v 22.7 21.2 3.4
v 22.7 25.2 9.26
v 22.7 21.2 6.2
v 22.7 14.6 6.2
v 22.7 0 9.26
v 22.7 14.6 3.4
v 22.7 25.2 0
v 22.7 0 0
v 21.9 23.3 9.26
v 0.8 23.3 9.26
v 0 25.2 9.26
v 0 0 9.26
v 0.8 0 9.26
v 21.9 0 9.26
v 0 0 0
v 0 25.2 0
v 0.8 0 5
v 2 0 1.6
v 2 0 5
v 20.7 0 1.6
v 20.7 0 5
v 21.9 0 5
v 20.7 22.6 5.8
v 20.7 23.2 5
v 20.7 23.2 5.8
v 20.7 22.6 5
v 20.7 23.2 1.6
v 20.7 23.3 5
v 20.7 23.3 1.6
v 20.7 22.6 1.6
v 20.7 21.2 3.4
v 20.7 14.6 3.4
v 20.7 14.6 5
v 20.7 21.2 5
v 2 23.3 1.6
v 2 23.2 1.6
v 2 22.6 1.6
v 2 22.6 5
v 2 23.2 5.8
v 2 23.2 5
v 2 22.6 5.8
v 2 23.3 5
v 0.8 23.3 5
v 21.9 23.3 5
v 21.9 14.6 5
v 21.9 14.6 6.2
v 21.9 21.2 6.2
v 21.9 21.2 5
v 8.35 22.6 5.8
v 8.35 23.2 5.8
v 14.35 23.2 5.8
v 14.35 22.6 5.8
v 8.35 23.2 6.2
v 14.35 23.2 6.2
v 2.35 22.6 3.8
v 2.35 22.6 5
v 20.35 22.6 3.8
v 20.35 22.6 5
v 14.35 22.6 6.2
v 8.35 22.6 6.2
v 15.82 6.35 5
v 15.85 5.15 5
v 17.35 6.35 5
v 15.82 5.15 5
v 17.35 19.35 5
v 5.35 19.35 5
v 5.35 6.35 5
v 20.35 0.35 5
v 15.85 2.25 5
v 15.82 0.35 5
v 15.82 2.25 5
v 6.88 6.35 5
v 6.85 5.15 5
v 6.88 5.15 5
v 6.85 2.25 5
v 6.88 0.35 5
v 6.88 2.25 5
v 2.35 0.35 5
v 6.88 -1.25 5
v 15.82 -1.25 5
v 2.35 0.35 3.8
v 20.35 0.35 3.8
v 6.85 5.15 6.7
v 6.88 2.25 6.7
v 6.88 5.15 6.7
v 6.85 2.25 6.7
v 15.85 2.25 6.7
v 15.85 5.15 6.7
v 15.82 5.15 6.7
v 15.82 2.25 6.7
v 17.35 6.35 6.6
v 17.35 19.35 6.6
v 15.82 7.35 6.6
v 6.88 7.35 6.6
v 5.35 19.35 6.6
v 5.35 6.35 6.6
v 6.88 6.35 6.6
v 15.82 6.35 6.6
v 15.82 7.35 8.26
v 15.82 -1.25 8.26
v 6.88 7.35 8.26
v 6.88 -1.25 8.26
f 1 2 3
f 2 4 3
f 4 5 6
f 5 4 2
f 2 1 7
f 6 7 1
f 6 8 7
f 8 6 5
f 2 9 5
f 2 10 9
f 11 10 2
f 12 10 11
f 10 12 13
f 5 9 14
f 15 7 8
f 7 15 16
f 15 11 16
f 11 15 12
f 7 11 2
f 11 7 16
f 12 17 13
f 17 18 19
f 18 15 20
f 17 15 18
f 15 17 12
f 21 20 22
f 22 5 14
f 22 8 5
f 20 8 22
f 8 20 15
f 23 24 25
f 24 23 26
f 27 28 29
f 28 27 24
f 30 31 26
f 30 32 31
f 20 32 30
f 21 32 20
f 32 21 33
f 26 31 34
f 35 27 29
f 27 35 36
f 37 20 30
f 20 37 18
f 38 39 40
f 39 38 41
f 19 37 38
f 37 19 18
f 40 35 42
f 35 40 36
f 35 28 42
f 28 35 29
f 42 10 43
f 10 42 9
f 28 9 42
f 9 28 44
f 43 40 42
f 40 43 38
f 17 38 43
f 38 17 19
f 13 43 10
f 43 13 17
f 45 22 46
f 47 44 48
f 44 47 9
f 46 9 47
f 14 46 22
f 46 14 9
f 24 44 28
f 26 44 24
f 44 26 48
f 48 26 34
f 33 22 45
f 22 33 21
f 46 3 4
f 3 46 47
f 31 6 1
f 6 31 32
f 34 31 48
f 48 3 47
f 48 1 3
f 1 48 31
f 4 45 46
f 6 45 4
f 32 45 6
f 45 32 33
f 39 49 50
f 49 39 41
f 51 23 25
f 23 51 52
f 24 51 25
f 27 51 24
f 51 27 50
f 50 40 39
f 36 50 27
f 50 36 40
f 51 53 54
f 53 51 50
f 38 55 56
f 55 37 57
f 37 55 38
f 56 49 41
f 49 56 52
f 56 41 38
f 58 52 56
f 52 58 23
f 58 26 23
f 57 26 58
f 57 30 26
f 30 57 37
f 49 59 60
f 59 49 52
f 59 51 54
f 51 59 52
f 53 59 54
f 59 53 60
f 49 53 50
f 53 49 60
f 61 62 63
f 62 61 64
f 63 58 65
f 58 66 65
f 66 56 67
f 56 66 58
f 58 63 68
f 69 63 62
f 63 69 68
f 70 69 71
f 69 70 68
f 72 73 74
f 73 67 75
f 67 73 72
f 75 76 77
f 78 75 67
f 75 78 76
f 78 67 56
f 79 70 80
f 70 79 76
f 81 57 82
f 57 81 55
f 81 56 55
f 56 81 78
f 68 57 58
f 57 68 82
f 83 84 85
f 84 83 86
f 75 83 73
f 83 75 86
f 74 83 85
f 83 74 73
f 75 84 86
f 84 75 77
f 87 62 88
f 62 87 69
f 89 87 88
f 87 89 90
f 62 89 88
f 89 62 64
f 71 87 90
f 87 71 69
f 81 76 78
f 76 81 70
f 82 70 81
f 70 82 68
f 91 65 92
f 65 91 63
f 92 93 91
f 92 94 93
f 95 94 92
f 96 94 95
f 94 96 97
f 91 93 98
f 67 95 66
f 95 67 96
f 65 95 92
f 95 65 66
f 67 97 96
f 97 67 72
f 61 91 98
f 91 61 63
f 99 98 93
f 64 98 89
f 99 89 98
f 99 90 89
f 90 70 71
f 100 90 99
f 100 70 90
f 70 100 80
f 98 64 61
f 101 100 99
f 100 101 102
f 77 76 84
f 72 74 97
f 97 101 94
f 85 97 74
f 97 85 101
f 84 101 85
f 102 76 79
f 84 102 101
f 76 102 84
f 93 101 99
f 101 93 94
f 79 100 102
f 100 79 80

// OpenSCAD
// =============================================================================
// mini7seg_esp_cradle.scad
//
// How an ESP32-C3 Super Mini — which has NO mounting holes — is held in the
// back of the display enclosure, free-wired, with its USB-C reachable.
//
// THE LOAD PATH IS THE WHOLE DESIGN
//   The only rigid, structural thing on this board is the USB-C shell: it is
//   soldered down with big anchor tabs and it is the one feature that can take
//   a shove. So the cradle uses it as the datum, and everything else just stops
//   the board rattling.
//
//     plugging a cable IN   pushes the board deeper  -> a hard stop behind the
//                                                       far end takes it
//     pulling a cable OUT   drags the board forward  -> the entry lip takes it
//     everything else       lift/rattle              -> the side slots take it
//
//   Get this backwards — retain the far end and leave the USB end floating —
//   and every insertion levers the connector off its pads. That is the usual
//   way these boards die.
//
// SLIDES IN FROM THE BACK, USB-C END FIRST, before the panel goes in.
//
// ⚠ DIMENSIONS ARE FROM PHOTOGRAPHS AND DATASHEET-TYPICALS, NOT MEASURED.
//   Caliper the four marked CHECK values before printing anything.
// =============================================================================

// ---------- ESP32-C3 Super Mini ----------
esp_w       = 18.0;    // CHECK  across the castellated rows
esp_l       = 22.5;    // CHECK  along the USB axis
esp_t       = 1.2;     // CHECK  pcb only
mod_w       = 12.0;    // the shielded module can
mod_l       = 13.0;
mod_t       = 1.6;
usb_w       = 8.94;    // CHECK  USB-C receptacle shell
usb_t       = 3.26;
usb_proud   = 1.6;     // how far it oversails the board edge
btn_w       = 3.5;     // RST and BOOT, either side of centre
btn_l       = 2.9;
btn_t       = 1.7;
btn_gap     = 2.0;     // between the two buttons

// ---------- fit ----------
slack       = 0.35;    // per side, board to slot
slot_grip   = 1.2;     // how far the side slots overlap the pcb edge
floor_t     = 1.6;
rail_t      = 2.2;     // material under the board, above the floor
wall        = 2.0;
btn_clear   = 1.0;     // air above the buttons so nothing presses them

// ---------- wiring ----------
// Three wires only: 5V, GND, one data. On this board 5V and G are adjacent on
// the right-hand row, with GPIO 0-4 directly below them, so all three land on
// ONE edge and the loom leaves as a single bundle.
wire_d      = 1.6;     // 22 AWG with insulation
wire_n      = 3;

// "cradle" | "fitted" | "section" | "exploded" | "esp"
mode = "fitted";

// ---------- derived ----------
pocket_w    = esp_w + 2 * slack;
pocket_l    = esp_l + 2 * slack;
z_board     = floor_t + rail_t;                 // underside of the pcb
z_top       = z_board + esp_t;                  // top face of the pcb
cradle_h    = z_top + max(usb_t, mod_t, btn_t + btn_clear) + 1.0;

// =============================================================================
// THE BOARD ITSELF — modelled so the clearances can be seen, not guessed
// =============================================================================
module esp32_c3() {
    // pcb
    color([0.10, 0.10, 0.12]) cube([esp_w, esp_l, esp_t]);
    // castellated pads, 8 per side at 2.54
    color([0.85, 0.70, 0.30])
        for (s = [0, 1], i = [0 : 7])
            translate([s ? esp_w - 0.9 : 0, 2.2 + i * 2.54, 0])
                cube([0.9, 1.6, esp_t]);
    // shielded module
    color([0.55, 0.55, 0.58])
        translate([(esp_w - mod_w) / 2, esp_l - mod_l - 3.5, esp_t]) cube([mod_w, mod_l, mod_t]);
    // RST / BOOT — these sit between the module and the USB end, which is why
    // the cradle cannot simply be a closed box at this end.
    color([0.80, 0.80, 0.82])
        for (k = [0, 1])
            translate([esp_w / 2 - btn_w - btn_gap / 2 + k * (btn_w + btn_gap), esp_l - mod_l - 3.5 - btn_l - 1.2, esp_t])
                cube([btn_w, btn_l, btn_t]);
    // USB-C receptacle, overhanging the near edge
    color([0.75, 0.75, 0.78])
        translate([(esp_w - usb_w) / 2, -usb_proud, esp_t]) cube([usb_w, 7.0 + usb_proud, usb_t]);
}

// =============================================================================
// THE CRADLE
// =============================================================================
module cradle() {
    difference() {
        union() {
            // floor + outer walls, open at the top and at the far (entry) end
            cube([pocket_w + 2 * wall, pocket_l + wall, cradle_h]);
        }

        // the pocket the board lives in
        translate([wall, 0, floor_t]) cube([pocket_w, pocket_l + 0.1, cradle_h]);

        // slots: the board slides in edgewise and cannot lift out
        translate([wall - slot_grip, 0, z_top]) cube([slot_grip + 0.1, pocket_l + 0.1, cradle_h]);
        translate([wall + pocket_w - 0.1, 0, z_top]) cube([slot_grip + 0.1, pocket_l + 0.1, cradle_h]);

        // USB-C aperture through the end wall. Deliberately a CLOSE fit on the
        // shell: this is the feature that locates the board, so slop here means
        // a board that waggles every time a cable goes in.
        translate([wall + (pocket_w - usb_w) / 2 - 0.3, -1, z_top - 0.3])
            cube([usb_w + 0.6, wall + 2, usb_t + 0.6]);

        // relief so a plug's overmould does not foul the outside of the wall
        translate([wall + (pocket_w - usb_w) / 2 - 2.2, -1, z_top - 2.0])
            cube([usb_w + 4.4, 1.4, usb_t + 4.0]);

        // wire exit — one bundle off the right-hand row
        translate([wall + pocket_w - 1.0, pocket_l - wire_n * (wire_d + 0.6) - 2, z_board - 0.4])
            cube([wall + 2, wire_n * (wire_d + 0.6), wire_d + 1.2]);
    }

    // Hard stop behind the far end. This — not the slots — is what absorbs the
    // shove of plugging a cable in.
    translate([wall, pocket_l - 0.6, floor_t]) cube([pocket_w, 0.6, rail_t + esp_t + 0.8]);

    // Entry lip: a small cantilever that the board clicks past going in, and
    // that stops it walking back out when a cable is pulled.
    translate([wall + pocket_w / 2 - 3, pocket_l - 0.6, z_top])
        cube([6, 0.6, 1.2]);
}

// =============================================================================
module fitted() {
    cradle();
    translate([wall + slack, slack, z_board]) esp32_c3();
}

if (mode == "esp") {
    esp32_c3();
} else if (mode == "cradle") {
    cradle();
} else if (mode == "exploded") {
    cradle();
    translate([wall + slack, slack, z_board + 16]) esp32_c3();
} else if (mode == "section") {
    difference() {
        fitted();
        translate([-1, -20, -1]) cube([(pocket_w + 2 * wall) / 2 + 1, 60, 40]);
    }
} else {
    fitted();
}

echo(str("cradle  ", pocket_w + 2 * wall, " x ", pocket_l + wall, " x ", cradle_h, " mm"));
echo(str("board sits at z ", z_board, "..", z_top, "   usb aperture z ", z_top - 0.3, "..", z_top + usb_t + 0.3));
echo(str("tallest thing above the pcb: ", max(usb_t, mod_t, btn_t + btn_clear), " mm"));
